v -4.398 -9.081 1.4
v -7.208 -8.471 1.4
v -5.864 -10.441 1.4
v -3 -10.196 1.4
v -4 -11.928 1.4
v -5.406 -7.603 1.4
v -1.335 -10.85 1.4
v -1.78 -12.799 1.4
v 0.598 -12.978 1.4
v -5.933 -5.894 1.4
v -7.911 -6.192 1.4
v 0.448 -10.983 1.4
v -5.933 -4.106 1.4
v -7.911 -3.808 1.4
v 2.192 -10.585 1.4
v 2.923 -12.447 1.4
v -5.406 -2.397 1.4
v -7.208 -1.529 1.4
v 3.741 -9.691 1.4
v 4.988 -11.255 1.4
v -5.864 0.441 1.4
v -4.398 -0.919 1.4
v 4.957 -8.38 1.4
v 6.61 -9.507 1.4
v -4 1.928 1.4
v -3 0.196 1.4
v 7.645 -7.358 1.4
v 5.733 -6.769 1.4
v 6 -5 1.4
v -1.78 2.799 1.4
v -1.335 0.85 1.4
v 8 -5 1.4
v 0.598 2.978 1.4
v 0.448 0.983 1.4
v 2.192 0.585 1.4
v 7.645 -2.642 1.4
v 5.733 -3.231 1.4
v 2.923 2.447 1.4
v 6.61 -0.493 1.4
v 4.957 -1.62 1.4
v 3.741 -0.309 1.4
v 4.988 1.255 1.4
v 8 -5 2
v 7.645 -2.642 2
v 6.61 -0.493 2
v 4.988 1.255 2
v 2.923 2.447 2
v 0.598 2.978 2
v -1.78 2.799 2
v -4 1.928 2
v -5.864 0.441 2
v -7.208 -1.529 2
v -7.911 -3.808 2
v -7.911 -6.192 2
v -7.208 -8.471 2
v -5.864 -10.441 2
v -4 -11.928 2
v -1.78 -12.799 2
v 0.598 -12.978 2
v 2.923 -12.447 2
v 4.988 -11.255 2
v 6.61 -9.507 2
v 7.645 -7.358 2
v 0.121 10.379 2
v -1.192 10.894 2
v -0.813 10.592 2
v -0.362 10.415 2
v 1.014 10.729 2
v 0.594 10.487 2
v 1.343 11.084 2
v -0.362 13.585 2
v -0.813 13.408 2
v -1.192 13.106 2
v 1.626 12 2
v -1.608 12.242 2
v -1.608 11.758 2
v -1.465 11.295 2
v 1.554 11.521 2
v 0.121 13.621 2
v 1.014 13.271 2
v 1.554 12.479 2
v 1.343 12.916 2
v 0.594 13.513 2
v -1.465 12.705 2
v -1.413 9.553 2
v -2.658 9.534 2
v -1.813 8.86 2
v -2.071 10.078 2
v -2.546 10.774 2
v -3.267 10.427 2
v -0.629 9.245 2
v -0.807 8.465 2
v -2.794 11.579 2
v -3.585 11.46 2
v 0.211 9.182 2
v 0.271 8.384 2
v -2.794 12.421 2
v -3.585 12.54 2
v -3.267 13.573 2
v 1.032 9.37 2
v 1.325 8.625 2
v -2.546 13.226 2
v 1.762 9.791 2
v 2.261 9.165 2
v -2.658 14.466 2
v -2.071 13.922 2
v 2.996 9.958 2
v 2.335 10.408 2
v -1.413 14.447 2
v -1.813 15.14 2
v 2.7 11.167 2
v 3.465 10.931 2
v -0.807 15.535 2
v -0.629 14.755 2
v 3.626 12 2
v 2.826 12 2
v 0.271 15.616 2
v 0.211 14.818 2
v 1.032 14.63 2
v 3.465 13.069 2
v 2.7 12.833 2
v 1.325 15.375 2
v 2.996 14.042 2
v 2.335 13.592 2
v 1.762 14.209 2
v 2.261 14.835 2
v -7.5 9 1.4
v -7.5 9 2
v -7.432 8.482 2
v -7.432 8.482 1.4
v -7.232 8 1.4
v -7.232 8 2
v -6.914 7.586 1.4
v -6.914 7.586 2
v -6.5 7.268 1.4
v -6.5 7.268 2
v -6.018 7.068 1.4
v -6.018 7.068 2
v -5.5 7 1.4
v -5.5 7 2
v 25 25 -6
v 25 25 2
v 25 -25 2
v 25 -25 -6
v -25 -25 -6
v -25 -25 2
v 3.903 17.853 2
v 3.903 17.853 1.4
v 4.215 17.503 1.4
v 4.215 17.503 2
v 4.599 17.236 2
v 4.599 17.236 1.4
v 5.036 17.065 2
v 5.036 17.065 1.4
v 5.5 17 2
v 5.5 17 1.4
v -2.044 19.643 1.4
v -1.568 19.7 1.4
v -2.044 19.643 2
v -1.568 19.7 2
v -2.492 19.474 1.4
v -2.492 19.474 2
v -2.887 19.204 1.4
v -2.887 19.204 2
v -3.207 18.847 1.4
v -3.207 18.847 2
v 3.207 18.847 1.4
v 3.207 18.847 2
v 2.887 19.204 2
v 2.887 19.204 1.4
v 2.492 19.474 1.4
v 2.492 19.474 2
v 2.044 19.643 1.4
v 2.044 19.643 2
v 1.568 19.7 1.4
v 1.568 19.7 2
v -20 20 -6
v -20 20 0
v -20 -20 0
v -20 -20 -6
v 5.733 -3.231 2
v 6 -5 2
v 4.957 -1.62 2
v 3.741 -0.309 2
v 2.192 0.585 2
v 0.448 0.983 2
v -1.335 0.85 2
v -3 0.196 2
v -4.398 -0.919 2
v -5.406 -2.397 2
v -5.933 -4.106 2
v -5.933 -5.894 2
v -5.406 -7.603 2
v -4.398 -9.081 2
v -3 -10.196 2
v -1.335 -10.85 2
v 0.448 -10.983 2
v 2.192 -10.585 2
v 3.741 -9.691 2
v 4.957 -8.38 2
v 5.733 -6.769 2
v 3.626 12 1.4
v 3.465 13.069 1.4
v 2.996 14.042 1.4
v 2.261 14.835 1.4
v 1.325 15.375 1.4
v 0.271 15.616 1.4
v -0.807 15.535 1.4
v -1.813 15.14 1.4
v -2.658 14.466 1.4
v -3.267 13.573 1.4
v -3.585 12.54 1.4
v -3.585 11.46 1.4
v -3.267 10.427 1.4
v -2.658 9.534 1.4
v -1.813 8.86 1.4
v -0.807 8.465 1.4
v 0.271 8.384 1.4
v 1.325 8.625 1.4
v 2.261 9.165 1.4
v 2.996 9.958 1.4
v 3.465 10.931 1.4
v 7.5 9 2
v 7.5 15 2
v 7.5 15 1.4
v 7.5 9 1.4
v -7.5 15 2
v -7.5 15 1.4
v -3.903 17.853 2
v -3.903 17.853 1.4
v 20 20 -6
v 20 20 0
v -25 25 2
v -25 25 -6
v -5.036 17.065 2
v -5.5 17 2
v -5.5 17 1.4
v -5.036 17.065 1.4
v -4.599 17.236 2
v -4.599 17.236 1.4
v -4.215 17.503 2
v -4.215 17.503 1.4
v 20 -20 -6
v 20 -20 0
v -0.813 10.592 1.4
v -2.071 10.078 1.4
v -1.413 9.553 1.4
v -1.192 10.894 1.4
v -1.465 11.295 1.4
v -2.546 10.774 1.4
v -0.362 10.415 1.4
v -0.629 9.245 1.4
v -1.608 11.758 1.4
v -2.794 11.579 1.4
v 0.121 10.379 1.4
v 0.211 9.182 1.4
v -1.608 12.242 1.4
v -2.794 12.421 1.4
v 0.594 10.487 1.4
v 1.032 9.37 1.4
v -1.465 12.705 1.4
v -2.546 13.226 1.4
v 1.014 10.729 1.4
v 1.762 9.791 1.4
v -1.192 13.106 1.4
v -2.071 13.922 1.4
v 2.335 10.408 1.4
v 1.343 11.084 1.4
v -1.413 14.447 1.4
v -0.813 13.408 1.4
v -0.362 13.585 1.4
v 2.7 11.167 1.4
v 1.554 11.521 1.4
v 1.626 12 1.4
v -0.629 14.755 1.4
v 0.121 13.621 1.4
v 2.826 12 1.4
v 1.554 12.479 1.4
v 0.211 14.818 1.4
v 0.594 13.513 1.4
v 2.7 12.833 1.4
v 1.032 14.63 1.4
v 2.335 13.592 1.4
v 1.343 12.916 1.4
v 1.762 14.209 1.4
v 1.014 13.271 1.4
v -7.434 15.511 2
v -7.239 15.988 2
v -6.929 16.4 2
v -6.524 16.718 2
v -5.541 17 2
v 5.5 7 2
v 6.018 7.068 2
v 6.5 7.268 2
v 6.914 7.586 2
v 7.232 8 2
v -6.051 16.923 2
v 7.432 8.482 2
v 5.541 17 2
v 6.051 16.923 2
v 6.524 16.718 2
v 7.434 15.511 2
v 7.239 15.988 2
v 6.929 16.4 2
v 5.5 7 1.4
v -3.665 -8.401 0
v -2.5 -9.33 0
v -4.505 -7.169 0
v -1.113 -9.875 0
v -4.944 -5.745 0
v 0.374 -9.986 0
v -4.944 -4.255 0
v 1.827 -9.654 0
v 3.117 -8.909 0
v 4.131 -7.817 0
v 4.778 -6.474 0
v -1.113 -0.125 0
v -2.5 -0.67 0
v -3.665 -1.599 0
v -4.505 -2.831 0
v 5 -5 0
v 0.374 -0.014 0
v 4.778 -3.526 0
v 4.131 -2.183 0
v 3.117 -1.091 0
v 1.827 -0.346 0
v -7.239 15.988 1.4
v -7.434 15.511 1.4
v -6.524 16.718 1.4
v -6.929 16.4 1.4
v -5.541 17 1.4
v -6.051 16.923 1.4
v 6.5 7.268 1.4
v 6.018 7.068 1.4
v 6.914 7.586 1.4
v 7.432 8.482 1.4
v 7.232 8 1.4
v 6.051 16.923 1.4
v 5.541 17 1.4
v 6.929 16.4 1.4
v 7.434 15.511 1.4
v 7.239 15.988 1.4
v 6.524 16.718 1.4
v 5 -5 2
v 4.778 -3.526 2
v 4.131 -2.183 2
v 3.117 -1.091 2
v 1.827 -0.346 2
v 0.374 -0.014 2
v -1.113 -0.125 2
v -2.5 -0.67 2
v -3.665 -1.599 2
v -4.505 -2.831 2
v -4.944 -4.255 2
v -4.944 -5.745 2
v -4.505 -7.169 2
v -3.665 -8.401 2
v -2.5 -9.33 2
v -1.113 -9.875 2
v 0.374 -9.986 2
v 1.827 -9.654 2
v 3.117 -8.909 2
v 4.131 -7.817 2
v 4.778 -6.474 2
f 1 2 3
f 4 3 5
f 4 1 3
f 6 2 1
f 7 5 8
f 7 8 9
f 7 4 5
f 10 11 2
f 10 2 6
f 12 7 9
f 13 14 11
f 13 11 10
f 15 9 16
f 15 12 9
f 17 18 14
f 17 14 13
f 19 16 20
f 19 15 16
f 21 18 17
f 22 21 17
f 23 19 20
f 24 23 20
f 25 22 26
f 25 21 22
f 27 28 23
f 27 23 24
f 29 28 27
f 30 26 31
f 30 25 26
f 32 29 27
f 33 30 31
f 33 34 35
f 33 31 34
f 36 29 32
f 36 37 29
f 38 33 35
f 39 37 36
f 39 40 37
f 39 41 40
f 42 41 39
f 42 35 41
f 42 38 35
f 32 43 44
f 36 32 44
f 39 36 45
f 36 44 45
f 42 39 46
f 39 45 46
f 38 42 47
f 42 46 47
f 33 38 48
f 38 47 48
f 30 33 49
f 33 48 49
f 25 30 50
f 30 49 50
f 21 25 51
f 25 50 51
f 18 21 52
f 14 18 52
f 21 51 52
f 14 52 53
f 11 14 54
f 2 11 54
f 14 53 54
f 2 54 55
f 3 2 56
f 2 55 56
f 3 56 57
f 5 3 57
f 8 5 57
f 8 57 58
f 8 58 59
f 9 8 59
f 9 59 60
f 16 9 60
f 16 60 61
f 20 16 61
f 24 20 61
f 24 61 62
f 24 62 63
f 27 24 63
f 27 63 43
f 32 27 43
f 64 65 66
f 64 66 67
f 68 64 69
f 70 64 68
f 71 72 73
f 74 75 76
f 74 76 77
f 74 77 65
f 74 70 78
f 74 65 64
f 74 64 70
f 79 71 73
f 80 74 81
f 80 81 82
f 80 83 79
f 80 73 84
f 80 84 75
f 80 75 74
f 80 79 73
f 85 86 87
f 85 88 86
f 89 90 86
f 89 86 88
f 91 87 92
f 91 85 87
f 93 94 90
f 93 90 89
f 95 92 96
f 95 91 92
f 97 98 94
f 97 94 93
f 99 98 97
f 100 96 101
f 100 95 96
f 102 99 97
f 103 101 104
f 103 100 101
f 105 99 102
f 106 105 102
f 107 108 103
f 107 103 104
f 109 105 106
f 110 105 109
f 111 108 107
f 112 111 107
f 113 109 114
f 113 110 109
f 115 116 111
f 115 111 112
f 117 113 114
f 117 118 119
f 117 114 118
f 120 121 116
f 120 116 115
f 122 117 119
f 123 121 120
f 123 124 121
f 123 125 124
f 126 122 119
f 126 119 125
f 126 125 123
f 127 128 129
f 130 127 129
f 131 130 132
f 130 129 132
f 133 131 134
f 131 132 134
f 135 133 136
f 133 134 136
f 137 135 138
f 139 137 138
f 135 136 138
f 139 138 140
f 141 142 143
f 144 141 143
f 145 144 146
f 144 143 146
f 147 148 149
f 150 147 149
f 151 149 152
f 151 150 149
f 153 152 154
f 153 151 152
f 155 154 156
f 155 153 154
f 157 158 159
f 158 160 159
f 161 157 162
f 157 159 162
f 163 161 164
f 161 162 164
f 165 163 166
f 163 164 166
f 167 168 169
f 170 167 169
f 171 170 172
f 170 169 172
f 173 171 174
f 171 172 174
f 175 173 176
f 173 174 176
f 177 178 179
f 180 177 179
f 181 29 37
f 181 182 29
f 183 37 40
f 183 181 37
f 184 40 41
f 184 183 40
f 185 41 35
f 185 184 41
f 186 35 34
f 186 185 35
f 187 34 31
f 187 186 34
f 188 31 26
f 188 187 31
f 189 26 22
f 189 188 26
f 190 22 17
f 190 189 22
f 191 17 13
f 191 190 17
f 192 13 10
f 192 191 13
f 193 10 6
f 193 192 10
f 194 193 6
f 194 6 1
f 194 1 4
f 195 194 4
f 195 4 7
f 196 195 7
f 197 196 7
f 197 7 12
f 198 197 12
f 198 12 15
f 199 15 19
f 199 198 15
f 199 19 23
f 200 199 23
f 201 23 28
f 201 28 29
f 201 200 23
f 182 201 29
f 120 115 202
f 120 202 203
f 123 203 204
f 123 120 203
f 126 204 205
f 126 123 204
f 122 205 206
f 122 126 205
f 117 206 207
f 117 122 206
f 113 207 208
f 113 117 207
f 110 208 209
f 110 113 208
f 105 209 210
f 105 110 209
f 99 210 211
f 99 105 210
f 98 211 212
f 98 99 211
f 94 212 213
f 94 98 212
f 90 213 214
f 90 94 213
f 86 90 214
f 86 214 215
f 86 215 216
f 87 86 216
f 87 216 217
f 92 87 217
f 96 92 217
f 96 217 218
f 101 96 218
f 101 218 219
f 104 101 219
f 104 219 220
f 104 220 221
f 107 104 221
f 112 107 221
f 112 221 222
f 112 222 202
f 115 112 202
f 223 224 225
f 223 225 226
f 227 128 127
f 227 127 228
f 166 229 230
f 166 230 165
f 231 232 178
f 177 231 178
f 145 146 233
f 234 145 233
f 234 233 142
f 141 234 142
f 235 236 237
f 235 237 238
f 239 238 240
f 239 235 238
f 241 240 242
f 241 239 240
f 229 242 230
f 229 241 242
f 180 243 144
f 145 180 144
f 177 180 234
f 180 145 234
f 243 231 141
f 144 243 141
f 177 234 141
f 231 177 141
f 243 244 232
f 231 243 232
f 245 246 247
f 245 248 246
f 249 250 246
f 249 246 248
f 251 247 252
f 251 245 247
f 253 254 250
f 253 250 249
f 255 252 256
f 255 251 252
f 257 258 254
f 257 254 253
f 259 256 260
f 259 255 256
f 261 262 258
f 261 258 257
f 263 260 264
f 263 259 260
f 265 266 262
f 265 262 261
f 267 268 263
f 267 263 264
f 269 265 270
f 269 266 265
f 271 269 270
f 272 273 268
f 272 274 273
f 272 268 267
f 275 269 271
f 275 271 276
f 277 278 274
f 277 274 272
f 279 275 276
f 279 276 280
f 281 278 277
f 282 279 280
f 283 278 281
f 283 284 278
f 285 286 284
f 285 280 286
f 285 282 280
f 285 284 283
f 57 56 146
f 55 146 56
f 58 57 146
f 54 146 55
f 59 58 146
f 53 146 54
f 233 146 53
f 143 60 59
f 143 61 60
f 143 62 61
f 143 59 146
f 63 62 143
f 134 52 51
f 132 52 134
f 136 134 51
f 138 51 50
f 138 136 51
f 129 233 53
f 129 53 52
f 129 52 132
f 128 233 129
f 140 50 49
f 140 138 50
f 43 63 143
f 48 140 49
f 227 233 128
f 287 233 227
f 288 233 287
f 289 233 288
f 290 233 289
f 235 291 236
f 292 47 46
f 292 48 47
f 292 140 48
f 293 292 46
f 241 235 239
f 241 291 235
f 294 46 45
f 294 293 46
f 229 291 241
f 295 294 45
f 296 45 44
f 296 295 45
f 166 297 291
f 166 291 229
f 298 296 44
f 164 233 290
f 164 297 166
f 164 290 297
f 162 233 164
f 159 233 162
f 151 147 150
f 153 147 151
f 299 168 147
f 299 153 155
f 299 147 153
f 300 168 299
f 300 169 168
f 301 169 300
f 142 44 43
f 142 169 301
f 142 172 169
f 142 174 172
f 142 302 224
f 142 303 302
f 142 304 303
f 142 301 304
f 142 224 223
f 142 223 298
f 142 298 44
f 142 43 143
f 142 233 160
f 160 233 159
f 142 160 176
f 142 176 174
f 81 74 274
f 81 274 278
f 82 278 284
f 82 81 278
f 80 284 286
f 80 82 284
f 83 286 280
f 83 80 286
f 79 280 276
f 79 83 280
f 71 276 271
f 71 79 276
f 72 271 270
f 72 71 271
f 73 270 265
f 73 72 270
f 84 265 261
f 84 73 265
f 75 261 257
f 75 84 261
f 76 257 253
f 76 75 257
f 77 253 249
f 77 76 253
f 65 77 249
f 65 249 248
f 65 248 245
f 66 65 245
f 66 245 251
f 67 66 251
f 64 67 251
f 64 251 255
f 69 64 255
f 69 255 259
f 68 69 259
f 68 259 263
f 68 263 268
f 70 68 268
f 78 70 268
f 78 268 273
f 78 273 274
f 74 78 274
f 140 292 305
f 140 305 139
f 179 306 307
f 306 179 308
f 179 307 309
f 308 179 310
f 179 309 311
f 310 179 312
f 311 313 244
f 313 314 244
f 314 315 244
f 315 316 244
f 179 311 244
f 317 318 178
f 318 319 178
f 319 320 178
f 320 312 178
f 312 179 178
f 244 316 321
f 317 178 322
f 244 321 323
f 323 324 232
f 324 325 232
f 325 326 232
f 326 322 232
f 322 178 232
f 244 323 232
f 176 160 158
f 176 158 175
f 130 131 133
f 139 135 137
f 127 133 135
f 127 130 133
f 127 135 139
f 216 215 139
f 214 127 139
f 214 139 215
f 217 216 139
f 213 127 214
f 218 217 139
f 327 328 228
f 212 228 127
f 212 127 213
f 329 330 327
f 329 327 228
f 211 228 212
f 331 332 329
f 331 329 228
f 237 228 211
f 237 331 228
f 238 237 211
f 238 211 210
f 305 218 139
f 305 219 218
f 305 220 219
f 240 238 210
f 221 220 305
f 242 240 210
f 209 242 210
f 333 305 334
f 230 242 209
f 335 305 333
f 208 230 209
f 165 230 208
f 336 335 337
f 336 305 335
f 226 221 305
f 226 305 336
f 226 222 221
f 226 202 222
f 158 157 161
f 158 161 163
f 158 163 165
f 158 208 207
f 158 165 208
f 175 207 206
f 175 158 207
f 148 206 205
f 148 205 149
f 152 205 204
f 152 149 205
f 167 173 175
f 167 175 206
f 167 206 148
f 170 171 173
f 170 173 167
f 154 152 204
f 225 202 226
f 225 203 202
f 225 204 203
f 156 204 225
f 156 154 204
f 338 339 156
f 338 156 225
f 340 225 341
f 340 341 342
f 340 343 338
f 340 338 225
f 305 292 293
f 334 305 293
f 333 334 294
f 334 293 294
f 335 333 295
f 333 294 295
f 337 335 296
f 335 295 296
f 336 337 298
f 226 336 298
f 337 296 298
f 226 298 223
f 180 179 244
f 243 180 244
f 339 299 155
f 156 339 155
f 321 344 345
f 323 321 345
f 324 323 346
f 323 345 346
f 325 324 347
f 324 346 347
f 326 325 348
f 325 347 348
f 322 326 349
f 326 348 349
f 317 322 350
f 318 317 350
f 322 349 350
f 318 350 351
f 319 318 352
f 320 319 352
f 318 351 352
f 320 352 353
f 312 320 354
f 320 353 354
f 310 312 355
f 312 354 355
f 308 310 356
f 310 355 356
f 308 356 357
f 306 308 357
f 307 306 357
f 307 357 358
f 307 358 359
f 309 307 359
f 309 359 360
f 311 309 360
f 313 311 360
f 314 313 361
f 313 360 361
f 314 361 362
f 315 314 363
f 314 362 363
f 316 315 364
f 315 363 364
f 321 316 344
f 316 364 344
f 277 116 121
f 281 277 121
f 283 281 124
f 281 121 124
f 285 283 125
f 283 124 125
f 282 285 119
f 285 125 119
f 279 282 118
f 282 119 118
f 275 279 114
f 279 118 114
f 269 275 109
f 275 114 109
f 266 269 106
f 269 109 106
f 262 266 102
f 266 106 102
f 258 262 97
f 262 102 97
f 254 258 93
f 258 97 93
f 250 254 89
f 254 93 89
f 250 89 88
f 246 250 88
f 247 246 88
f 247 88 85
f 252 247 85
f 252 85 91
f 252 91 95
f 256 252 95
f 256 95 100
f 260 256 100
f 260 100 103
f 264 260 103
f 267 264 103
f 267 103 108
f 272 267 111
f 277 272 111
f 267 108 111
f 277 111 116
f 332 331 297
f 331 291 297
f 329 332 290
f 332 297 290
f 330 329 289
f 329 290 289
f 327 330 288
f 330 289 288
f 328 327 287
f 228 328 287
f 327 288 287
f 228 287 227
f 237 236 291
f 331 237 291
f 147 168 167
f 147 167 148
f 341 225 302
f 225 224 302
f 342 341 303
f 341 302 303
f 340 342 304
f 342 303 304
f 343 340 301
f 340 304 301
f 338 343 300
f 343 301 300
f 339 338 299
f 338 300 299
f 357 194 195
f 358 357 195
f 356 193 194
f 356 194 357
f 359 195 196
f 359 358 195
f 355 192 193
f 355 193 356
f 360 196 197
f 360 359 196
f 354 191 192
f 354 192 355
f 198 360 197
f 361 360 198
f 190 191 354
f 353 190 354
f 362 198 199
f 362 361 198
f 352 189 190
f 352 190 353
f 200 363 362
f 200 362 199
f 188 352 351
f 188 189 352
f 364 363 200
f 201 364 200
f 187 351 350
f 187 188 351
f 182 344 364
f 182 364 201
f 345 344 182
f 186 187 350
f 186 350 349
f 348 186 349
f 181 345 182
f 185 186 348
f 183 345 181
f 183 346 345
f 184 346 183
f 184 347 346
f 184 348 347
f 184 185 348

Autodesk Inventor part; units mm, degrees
ref_plane "YZ Plane" through (0, 0, 0) normal (1, 0, 0) x (0, 1, 0)
ref_plane "XZ Plane" through (0, 0, 0) normal (0, 1, 0) x (-1, 0, 0)
ref_plane "XY Plane" through (0, 0, 0) normal (0, 0, 1) x (1, 0, 0)
sketch "Boceto1" plane through (0, 0, 0) normal (0, 0, 1) x (1, 0, 0)
  line L0 (-20, -20) -> (20, -20)
  line L1 (20, -20) -> (20, 20)
  line L2 (20, 20) -> (-20, 20)
  line L3 (-20, 20) -> (-20, -20)
  line L4 (-20, -20) -> (20, 20) construction
  line L5 (20, -20) -> (-20, 20) construction
  line L6 (-25, 25) -> (25, 25)
  line L7 (25, 25) -> (25, -25)
  line L8 (25, -25) -> (-25, -25)
  line L9 (-25, -25) -> (-25, 25)
  point P0 (0, 0)
  dimension "d0" = 40
  dimension "d1" = 40
  dimension "d2" = 5
extrude "Extrusión1" add sketch "Boceto1" against normal blind 6
extrude "Extrusión2" add sketch "Boceto1" along normal blind 2 contours L3 L2 L1 L0 | L6 L7 L8 L9
sketch "Boceto3" plane through (0, 0, 2) normal (0, 0, 1) x (1, 0, 0)
  line L0 (25, -25) -> (-25, -25) projected
  line L1 (-25, -25) -> (-25, 25) projected
  line L2 (-25, 25) -> (25, 25) projected
  line L3 (25, 25) -> (25, -25) projected
  line L4 (20, -20) -> (-20, -20) projected
  line L5 (-20, -20) -> (-20, 20) projected
  line L6 (-20, 20) -> (20, 20) projected
  line L7 (20, 20) -> (20, -20) projected
  line L8 (-20, -5) -> (20, -5) construction
  circle A0 centre (0, -5) radius 5
  circle A1 centre (0, -5) radius 6
  circle A2 centre (0, -5) radius 8
  line L9 (-20, 12) -> (20, 12) construction
  line L10 (0, 3) -> (0, -5) construction
  line L11 (5.5, 7) -> (-5.5, 7)
  line L12 (-7.5, 9) -> (-7.5, 15)
  line L13 (7.5, 15) -> (7.5, 9)
  line L14 (7.5, 7) -> (-7.5, 17) construction
  line L15 (-7.5, 7) -> (7.5, 17) construction
  line L16 (-3.9028, 17.8528) -> (-3.2066, 18.8472)
  line L17 (3.2066, 18.8472) -> (3.9028, 17.8528)
  line L18 (-1.5683, 19.7) -> (1.5683, 19.7)
  circle A3 centre (0, 12) radius 1.6258
  circle A4 centre (0, 12) radius 2.8258
  circle A5 centre (0, 12) radius 3.6258
  line L19 (-5.5, 17) -> (-5.5411, 17)
  line L20 (5.5411, 17) -> (5.5, 17)
  arc A6 (-5.5411, 17) -> (-3.9028, 17.8528) centre (-5.5411, 19) ccw
  arc A7 (-1.5683, 19.7) -> (-3.2066, 18.8472) centre (-1.5683, 17.7) ccw
  arc A8 (3.2066, 18.8472) -> (1.5683, 19.7) centre (1.5683, 17.7) ccw
  arc A9 (3.9028, 17.8528) -> (5.5411, 17) centre (5.5411, 19) ccw
  arc A10 (-5.5, 17) -> (-7.5, 15) centre (-5.5, 15) ccw
  arc A11 (-7.5, 9) -> (-5.5, 7) centre (-5.5, 9) ccw
  arc A12 (5.5, 7) -> (7.5, 9) centre (5.5, 9) ccw
  arc A13 (7.5, 15) -> (5.5, 17) centre (5.5, 15) ccw
  point P0 (0, 0)
  point P1 (-4.5, 17)
  point P2 (5.5206, 17)
  dimension "d13" = 15
  dimension "d14" = 10
  dimension "d17" = 1
  dimension "d18" = 2
  dimension "d21" = 9
  dimension "d22" = 15
  dimension "d23" = 10
  dimension "d25" = 3
  dimension "d27" = 3.2517
  dimension "d28" = 1.2
  dimension "d29" = 0.8
  dimension "d30" = 2.7
  dimension "d31" = 125
  dimension "d32" = 2
  dimension "d33" = 2
extrude "Extrusión4" cut sketch "Boceto3" against normal through all contours A0
extrude "Extrusión5" cut sketch "Boceto3" against normal blind 0.6 contours A2
extrude "Extrusión6" cut sketch "Boceto3" against normal blind 0.6 contours L11 A11 L12 A10 L19 A6 L16 A7 L18 A8 L17 A9 L20 A13 L13 A12 | A4
sketch "Boceto4" plane through (0, 0, -6) normal (0, 0, -1) x (-1, 0, 0)
  point P0 (0, 0)
equation "\"d1\" = d0"
equation "\"d14\" = D_camara"
equation "\"D_camara\" = 10"
properties part number "Tapa_camara"
